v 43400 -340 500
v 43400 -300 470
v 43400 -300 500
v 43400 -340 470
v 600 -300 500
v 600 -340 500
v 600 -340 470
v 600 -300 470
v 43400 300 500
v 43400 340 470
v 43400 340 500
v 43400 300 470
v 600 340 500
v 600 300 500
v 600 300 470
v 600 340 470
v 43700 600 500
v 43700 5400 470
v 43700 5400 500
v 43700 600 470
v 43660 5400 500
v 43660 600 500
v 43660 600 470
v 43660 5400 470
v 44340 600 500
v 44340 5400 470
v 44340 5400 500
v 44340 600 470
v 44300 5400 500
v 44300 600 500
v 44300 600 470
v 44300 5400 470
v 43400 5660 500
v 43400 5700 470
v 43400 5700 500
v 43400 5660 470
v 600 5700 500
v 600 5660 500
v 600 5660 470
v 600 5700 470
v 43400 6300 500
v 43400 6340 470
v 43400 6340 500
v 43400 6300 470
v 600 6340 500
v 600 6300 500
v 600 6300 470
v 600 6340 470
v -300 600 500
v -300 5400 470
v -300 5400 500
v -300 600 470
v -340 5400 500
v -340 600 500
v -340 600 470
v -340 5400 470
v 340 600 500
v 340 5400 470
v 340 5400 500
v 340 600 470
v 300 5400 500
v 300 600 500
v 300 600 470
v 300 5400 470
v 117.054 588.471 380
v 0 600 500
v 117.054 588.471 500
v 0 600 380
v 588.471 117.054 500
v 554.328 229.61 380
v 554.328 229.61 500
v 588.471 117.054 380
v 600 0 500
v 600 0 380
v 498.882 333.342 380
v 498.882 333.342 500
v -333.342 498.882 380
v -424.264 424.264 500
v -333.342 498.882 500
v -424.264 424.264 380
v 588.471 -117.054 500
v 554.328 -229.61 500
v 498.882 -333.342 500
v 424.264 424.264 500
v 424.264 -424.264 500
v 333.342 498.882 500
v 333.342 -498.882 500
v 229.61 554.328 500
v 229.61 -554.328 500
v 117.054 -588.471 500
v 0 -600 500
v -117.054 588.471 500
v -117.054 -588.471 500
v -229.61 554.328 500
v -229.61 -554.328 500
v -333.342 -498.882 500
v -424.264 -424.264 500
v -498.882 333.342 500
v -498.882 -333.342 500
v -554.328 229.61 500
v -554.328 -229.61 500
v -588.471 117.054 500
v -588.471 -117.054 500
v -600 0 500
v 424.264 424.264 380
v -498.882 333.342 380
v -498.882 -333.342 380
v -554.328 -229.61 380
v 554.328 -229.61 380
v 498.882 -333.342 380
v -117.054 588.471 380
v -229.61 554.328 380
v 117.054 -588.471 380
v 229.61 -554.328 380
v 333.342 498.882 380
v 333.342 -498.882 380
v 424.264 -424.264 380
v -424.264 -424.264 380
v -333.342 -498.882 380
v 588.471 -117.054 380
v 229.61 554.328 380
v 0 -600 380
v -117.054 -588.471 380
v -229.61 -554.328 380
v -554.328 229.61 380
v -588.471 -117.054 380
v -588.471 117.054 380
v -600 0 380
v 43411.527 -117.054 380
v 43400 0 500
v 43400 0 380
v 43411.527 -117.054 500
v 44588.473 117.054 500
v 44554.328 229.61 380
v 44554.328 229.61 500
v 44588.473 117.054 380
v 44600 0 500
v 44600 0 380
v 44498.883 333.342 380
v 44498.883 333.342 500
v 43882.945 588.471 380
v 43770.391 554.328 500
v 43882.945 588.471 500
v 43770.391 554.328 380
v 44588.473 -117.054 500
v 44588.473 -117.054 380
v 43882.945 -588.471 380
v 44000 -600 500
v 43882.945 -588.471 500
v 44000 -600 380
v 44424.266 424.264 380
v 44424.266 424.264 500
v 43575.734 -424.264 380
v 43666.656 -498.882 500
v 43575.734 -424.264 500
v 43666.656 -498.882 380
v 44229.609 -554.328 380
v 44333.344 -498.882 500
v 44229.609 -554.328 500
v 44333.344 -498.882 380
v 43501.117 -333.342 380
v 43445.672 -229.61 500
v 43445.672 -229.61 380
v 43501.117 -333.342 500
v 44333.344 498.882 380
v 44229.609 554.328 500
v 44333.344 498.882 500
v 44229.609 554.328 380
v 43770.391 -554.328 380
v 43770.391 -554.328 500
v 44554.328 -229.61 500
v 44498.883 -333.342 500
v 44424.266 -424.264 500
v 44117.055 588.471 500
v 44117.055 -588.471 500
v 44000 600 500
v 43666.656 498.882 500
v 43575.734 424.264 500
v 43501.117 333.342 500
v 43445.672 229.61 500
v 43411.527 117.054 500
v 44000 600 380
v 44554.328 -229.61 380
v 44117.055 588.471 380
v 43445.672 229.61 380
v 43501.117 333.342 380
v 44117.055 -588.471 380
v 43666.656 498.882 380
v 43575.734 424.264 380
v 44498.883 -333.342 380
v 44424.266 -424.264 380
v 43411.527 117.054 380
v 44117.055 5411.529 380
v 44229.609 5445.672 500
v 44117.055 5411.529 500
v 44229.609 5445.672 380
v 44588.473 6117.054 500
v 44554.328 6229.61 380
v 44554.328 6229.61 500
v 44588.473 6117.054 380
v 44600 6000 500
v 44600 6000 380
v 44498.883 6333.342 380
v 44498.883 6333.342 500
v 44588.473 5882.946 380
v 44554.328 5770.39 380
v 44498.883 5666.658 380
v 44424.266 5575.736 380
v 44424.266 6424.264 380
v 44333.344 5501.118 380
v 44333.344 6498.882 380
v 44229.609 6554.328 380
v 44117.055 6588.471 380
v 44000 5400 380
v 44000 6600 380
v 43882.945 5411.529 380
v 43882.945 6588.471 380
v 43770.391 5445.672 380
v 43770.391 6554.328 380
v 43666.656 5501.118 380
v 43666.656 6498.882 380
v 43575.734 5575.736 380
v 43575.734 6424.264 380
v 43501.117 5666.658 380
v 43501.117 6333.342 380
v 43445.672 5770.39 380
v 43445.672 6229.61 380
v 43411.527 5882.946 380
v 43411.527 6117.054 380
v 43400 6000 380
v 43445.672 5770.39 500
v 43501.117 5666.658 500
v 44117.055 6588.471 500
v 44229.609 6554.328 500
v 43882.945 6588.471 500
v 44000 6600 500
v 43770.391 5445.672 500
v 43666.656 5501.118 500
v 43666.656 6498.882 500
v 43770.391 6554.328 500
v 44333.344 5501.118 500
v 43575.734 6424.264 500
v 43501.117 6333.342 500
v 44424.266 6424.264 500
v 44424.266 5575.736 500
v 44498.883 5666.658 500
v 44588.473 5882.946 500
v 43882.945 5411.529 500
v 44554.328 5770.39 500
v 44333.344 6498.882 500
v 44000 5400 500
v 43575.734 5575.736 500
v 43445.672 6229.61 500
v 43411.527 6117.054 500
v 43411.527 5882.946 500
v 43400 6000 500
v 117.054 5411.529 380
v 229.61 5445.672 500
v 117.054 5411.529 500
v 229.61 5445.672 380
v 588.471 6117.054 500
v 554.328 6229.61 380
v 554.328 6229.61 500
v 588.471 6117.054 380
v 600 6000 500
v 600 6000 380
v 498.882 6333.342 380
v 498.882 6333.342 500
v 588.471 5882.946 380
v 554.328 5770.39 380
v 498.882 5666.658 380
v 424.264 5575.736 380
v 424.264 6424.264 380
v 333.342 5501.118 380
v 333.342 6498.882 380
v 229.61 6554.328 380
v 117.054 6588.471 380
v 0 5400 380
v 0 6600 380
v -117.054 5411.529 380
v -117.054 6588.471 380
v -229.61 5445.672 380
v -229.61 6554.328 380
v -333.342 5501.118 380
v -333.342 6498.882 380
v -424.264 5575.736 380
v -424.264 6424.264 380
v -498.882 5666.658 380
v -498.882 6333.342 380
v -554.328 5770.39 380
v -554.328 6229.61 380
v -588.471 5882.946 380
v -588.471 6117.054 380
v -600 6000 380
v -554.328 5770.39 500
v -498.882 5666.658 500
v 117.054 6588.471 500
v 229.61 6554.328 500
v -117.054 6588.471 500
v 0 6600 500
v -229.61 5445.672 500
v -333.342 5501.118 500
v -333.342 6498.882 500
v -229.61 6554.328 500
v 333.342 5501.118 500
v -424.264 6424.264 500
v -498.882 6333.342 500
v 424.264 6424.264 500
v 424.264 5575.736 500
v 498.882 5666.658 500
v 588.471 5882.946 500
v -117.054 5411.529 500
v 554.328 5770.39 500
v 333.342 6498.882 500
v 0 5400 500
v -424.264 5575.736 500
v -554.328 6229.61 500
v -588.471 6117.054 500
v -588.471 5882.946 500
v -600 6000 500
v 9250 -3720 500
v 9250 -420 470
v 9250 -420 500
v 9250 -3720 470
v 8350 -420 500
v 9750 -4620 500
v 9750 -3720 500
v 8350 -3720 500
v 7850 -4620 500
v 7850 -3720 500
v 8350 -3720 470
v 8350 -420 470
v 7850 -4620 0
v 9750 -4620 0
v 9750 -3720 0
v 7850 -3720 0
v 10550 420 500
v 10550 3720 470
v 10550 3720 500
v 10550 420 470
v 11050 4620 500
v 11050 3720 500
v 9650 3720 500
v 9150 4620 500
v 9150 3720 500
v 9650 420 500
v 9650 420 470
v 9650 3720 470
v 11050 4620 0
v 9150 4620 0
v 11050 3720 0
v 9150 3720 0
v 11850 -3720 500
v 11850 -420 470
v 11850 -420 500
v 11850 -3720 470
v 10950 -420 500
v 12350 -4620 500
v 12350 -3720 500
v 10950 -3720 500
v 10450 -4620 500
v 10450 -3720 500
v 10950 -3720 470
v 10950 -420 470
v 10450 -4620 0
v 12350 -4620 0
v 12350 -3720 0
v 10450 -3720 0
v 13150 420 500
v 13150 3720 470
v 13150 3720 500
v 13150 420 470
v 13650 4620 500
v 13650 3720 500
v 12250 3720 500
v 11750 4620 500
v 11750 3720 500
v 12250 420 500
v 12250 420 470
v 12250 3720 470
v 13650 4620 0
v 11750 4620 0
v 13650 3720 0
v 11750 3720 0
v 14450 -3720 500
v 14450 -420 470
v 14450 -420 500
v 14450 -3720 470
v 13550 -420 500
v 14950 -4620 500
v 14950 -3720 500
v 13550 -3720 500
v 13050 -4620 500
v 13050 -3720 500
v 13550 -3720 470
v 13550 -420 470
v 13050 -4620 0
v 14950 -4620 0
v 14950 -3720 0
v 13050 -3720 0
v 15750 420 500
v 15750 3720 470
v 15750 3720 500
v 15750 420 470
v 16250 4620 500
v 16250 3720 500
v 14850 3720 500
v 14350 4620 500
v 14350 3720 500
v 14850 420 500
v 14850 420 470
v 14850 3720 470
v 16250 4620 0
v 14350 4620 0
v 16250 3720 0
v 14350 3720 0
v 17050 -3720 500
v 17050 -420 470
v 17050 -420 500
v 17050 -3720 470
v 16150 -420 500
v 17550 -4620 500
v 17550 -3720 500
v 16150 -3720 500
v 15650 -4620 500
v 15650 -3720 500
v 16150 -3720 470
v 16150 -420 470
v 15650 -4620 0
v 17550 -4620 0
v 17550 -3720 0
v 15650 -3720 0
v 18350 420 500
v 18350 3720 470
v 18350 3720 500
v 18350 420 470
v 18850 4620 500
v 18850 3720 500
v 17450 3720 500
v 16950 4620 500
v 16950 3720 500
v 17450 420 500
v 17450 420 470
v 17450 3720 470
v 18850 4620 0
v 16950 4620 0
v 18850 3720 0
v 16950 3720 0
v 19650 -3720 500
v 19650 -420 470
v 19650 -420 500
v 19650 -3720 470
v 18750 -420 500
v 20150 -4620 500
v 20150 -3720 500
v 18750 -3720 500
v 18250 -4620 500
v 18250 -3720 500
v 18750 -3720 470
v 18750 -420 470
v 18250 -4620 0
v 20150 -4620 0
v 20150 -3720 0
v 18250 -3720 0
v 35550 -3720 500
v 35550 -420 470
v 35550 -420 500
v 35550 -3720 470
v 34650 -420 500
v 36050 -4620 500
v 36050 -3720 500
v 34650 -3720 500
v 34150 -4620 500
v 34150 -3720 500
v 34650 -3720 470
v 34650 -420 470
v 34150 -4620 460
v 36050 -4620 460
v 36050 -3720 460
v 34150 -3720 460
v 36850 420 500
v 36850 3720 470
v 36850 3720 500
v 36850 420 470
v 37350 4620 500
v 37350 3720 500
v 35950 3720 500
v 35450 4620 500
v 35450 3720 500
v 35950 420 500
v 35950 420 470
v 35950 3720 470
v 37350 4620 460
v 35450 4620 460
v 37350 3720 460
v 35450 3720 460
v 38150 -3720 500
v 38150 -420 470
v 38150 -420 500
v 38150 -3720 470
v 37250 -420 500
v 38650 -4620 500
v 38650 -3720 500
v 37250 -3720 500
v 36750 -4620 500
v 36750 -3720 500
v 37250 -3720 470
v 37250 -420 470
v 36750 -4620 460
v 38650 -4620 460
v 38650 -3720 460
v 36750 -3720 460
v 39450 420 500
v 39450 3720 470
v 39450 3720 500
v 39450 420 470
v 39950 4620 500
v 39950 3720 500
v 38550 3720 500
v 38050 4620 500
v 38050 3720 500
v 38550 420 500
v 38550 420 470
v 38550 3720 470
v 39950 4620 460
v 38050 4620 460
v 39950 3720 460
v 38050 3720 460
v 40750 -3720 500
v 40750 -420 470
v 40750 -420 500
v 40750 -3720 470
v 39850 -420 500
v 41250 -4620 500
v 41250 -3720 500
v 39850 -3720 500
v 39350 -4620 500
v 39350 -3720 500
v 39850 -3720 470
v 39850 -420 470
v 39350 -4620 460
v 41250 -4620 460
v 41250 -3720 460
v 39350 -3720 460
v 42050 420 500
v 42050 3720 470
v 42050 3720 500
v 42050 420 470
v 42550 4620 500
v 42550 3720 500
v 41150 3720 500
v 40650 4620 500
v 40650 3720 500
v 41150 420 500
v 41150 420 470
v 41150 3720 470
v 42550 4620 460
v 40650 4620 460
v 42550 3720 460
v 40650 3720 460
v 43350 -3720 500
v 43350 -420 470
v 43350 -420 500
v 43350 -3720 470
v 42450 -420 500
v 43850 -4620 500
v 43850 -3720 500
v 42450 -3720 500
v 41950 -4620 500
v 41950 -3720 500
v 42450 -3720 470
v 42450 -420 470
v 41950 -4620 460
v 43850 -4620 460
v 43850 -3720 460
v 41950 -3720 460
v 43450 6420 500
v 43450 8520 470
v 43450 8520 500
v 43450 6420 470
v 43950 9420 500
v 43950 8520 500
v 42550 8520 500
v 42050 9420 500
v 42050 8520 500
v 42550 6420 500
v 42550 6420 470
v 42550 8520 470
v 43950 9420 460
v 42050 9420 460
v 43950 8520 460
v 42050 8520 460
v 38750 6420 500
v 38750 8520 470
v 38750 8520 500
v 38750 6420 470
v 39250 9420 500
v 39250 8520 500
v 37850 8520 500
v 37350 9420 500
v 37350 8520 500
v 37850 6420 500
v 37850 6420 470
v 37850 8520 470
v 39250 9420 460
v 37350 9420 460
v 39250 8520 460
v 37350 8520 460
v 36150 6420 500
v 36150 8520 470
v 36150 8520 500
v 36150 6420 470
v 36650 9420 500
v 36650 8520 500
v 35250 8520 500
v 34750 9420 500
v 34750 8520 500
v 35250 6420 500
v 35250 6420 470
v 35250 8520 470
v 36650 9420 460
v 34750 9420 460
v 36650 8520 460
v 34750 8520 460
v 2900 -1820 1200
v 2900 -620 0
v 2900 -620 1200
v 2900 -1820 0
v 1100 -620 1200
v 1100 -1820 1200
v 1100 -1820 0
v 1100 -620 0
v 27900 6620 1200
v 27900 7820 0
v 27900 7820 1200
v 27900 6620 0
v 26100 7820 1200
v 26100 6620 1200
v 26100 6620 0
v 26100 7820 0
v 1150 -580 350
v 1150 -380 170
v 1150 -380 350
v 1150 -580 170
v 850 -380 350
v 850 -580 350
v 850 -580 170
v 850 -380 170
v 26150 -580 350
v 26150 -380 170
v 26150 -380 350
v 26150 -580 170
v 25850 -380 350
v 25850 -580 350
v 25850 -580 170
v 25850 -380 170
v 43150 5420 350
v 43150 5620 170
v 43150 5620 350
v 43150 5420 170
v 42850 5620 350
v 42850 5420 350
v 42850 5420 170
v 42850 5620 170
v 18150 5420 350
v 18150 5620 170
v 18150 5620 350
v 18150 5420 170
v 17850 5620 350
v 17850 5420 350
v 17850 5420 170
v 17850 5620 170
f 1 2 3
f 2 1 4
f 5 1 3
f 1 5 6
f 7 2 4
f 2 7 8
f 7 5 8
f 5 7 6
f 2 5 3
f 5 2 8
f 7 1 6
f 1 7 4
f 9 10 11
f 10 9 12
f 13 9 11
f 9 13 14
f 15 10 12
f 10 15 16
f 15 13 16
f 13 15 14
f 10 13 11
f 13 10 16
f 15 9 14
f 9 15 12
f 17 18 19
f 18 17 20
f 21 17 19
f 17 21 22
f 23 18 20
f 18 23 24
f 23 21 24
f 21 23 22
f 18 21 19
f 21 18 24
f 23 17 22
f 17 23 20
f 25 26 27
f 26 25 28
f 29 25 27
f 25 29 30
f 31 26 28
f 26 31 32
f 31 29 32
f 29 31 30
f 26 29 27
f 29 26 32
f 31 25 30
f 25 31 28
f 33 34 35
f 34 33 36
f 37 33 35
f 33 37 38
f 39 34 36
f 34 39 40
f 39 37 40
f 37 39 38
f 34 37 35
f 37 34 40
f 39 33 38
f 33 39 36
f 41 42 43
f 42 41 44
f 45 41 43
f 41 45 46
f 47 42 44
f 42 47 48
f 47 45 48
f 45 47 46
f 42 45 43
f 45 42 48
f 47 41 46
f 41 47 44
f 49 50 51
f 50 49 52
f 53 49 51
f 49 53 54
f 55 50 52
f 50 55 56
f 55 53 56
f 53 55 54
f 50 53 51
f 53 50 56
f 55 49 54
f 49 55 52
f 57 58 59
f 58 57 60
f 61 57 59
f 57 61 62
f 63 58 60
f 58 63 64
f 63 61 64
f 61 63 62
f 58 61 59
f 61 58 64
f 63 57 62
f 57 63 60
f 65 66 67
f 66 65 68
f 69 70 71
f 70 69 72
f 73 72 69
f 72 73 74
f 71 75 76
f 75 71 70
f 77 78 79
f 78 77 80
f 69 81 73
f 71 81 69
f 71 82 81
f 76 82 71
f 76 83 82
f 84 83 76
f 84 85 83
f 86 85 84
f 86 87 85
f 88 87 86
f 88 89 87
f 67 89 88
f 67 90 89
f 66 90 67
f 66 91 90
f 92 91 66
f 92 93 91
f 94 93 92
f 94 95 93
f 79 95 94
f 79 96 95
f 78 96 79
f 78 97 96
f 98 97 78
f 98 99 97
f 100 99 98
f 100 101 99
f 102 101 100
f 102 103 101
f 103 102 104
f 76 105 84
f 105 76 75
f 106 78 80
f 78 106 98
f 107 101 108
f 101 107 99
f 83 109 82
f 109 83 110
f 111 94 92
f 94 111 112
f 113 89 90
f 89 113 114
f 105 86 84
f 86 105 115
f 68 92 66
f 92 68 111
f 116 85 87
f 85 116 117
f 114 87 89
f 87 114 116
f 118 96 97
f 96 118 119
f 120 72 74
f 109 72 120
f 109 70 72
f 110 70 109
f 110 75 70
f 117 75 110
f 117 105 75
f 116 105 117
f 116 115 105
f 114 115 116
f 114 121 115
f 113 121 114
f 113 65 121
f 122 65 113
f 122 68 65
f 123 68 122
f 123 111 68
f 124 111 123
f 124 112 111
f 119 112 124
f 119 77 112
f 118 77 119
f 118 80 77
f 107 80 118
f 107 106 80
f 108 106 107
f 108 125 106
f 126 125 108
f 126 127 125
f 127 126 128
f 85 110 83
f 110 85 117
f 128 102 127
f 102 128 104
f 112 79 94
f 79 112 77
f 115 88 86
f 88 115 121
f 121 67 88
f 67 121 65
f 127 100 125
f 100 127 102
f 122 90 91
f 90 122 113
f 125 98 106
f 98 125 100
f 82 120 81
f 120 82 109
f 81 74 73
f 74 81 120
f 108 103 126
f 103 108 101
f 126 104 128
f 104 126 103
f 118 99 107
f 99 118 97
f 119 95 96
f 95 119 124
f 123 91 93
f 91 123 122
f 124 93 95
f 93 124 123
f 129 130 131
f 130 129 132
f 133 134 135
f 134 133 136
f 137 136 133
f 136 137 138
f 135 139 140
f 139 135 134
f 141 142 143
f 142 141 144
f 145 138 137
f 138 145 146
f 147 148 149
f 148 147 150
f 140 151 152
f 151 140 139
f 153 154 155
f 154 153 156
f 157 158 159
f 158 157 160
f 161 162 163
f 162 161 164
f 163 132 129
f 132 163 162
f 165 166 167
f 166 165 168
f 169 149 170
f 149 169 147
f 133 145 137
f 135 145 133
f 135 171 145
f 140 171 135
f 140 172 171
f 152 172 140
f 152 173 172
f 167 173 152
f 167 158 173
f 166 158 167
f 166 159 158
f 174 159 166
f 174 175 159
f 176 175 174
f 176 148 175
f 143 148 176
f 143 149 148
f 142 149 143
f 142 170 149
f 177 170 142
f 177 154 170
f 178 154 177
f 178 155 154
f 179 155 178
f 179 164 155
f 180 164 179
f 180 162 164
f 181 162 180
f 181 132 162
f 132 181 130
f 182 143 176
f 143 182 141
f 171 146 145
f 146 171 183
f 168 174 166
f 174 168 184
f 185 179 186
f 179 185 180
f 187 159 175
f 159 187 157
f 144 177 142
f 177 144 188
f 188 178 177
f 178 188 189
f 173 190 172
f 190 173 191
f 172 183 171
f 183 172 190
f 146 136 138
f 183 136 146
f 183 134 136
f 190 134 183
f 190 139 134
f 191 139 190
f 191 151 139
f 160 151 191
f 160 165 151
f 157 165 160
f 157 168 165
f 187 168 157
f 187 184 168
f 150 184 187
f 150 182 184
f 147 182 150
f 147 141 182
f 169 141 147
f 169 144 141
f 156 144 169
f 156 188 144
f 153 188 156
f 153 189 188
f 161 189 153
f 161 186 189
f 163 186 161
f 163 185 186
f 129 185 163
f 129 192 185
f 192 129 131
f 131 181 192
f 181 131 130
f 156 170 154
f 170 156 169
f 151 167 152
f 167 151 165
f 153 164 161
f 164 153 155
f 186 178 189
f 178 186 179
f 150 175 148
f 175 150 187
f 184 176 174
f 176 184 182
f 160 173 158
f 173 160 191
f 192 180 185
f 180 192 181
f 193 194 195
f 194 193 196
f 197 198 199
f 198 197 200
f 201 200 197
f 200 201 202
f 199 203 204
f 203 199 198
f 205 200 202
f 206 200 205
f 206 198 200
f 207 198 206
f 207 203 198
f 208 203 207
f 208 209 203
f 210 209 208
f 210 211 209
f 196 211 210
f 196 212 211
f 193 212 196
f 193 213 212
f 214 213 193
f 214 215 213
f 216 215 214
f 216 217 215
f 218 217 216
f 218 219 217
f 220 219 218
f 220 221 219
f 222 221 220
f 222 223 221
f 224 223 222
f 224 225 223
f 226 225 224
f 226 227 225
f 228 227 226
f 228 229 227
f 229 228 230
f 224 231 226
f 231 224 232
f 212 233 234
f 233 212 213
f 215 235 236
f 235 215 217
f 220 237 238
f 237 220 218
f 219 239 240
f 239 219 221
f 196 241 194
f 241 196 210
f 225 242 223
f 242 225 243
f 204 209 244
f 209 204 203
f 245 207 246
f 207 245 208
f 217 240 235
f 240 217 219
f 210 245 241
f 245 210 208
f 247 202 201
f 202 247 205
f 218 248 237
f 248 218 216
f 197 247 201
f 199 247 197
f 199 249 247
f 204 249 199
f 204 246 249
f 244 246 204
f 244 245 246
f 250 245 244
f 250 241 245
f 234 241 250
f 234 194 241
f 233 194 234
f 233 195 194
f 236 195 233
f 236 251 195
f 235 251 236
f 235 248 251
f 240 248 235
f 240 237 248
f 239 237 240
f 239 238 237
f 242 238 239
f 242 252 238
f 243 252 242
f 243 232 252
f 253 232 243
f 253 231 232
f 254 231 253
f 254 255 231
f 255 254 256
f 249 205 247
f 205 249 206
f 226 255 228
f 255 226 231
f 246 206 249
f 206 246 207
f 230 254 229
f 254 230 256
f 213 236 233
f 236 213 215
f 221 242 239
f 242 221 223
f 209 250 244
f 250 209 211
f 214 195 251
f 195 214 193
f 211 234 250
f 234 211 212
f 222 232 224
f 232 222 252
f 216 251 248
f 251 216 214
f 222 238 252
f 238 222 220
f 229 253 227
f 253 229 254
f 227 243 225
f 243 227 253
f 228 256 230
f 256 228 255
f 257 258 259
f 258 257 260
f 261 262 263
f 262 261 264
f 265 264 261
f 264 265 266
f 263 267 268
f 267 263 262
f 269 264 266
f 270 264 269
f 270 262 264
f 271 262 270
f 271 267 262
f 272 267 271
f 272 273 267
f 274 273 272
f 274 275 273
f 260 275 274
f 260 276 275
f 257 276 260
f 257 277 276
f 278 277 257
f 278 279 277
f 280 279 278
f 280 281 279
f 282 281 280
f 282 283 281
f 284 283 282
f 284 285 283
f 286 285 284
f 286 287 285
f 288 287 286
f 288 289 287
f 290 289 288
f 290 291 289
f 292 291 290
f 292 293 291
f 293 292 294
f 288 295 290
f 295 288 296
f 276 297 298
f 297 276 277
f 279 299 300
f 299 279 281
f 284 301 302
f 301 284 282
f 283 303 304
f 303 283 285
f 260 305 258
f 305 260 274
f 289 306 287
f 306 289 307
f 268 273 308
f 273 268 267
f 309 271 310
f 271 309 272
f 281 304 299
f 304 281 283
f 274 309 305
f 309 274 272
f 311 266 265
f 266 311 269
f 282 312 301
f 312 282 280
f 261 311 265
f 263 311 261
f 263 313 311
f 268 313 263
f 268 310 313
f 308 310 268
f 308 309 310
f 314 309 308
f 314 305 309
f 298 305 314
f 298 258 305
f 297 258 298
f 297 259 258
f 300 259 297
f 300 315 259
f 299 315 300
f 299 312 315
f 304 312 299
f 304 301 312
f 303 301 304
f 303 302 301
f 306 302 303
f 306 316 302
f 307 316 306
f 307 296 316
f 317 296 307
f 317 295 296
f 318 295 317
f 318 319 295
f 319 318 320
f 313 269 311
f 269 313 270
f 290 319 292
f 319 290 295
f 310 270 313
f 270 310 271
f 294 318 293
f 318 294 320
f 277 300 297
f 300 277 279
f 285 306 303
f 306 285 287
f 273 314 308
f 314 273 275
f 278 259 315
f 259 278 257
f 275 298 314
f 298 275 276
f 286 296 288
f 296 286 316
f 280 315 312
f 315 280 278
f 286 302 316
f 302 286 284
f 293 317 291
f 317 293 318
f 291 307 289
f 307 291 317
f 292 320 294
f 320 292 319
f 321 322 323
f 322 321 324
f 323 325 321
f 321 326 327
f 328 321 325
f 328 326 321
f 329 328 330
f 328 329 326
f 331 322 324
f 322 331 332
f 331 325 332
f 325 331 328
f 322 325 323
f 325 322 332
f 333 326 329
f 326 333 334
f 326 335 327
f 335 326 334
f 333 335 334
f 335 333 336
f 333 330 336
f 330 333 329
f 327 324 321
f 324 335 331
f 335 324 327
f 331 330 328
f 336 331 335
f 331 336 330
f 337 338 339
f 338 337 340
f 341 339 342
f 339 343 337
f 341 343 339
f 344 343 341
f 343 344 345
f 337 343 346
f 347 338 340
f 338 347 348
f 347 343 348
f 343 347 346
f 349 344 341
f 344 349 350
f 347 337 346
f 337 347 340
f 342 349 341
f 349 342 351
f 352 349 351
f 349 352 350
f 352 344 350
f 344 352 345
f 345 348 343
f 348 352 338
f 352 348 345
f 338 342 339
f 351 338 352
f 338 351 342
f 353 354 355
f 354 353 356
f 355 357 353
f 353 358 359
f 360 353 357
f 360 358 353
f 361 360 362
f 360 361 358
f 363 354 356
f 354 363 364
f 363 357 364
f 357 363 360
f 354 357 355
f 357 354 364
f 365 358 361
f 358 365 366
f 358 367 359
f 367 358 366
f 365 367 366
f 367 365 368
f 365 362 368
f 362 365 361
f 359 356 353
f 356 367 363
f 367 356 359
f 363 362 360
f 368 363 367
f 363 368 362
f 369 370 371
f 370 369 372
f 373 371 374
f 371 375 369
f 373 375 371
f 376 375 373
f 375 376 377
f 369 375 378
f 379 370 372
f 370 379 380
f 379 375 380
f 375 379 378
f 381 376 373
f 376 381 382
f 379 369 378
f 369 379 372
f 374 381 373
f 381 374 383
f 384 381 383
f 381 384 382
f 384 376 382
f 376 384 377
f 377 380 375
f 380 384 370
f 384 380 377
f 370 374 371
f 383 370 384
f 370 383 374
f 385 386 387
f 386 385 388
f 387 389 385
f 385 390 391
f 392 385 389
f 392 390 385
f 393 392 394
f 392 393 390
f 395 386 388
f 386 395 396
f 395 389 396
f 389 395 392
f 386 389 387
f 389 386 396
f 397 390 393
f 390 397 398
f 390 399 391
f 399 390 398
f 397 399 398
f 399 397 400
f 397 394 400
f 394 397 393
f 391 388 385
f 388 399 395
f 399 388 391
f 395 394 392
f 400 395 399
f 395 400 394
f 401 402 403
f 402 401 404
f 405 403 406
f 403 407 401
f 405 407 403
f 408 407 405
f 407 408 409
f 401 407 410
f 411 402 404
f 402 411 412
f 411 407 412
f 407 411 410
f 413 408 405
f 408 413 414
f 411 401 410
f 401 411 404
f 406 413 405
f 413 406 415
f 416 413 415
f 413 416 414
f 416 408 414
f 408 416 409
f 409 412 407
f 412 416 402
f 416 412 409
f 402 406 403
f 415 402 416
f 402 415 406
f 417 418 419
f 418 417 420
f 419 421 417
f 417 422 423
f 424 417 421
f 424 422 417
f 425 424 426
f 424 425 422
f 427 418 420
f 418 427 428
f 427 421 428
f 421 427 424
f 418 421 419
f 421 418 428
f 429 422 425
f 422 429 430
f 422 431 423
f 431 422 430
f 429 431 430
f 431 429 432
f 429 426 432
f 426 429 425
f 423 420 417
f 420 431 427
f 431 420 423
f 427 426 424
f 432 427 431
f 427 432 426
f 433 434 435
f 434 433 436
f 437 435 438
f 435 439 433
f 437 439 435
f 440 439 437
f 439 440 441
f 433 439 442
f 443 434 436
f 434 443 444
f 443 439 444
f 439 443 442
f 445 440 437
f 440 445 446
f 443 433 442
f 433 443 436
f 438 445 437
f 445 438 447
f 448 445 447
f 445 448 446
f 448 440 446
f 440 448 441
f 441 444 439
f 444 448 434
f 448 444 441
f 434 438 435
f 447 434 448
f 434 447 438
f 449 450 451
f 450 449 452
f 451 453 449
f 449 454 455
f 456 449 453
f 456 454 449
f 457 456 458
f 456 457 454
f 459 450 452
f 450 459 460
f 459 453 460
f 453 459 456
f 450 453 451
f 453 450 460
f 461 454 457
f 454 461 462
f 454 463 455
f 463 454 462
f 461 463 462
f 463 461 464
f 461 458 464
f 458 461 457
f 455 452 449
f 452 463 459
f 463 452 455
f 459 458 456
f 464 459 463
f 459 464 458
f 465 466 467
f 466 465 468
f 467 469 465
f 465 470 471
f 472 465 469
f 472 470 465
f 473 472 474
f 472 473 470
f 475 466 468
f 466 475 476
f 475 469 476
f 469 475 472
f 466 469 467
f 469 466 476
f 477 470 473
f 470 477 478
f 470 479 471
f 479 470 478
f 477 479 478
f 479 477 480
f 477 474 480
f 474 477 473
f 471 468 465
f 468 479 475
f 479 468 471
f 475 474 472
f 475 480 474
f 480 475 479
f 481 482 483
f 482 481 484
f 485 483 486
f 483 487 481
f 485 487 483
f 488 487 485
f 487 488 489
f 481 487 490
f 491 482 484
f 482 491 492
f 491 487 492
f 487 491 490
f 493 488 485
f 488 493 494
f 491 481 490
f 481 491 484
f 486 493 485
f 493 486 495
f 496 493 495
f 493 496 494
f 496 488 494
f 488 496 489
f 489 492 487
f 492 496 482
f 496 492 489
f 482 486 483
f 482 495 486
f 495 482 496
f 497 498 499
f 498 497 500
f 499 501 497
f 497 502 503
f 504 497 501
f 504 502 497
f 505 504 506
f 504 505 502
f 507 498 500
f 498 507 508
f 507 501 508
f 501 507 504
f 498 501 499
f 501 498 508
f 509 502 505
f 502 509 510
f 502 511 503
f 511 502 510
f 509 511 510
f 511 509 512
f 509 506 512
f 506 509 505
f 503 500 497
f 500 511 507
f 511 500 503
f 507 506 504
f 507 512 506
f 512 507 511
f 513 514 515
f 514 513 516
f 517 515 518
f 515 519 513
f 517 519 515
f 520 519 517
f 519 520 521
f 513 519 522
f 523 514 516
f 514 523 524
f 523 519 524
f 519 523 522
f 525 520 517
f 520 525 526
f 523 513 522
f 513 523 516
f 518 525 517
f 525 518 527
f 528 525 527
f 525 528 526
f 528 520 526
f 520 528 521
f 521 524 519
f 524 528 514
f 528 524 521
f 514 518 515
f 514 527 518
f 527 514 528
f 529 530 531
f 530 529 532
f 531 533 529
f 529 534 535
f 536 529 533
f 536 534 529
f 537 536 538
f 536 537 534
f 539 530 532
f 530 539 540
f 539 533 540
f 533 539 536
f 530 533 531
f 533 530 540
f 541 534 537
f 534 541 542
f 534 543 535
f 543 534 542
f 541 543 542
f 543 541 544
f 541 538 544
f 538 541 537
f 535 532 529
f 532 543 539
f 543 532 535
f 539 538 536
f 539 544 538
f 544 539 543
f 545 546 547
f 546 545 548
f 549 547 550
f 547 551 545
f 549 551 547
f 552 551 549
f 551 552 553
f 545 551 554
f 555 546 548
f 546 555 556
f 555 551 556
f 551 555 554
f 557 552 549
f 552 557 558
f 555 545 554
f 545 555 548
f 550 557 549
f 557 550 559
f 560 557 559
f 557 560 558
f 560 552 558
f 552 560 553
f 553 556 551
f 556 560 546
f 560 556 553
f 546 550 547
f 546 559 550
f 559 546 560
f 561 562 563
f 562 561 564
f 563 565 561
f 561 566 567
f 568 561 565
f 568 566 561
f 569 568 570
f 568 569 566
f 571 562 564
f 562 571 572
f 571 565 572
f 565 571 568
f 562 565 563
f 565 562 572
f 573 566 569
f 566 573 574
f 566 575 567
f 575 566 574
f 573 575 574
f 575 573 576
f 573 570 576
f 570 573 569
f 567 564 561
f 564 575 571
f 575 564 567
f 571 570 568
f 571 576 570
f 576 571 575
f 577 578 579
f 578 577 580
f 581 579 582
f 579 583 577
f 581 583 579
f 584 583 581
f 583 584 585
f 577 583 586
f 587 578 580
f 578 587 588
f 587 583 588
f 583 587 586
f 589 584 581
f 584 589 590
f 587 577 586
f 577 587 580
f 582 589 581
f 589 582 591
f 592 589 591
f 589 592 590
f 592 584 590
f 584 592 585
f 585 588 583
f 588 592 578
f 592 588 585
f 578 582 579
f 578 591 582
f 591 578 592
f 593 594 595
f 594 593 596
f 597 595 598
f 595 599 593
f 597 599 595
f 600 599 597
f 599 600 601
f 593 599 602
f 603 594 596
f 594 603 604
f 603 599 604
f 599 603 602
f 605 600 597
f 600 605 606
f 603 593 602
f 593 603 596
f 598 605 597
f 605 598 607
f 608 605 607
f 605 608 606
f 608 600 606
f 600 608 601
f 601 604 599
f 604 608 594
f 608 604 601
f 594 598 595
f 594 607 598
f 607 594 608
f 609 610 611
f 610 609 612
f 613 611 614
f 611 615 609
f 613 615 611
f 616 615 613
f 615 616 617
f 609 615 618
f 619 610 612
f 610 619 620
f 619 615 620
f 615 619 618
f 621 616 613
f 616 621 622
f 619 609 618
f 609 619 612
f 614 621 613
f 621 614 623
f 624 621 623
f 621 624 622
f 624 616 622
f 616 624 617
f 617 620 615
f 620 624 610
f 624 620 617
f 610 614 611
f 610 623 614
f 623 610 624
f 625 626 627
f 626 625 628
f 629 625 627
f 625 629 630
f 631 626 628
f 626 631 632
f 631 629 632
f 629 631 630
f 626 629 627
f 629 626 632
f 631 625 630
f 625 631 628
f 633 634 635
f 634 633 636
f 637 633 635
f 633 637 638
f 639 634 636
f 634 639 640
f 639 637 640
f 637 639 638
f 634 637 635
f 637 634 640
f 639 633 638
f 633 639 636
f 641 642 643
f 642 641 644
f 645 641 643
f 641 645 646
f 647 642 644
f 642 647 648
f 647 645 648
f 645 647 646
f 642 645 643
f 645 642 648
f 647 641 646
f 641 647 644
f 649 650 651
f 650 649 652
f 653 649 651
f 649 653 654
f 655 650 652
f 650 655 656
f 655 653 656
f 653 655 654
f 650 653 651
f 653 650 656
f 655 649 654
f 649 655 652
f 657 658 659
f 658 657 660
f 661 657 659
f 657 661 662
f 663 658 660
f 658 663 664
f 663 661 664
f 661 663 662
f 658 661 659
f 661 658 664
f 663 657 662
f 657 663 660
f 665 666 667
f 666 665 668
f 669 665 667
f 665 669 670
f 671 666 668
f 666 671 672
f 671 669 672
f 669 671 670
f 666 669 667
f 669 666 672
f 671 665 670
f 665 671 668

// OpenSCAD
// loop_layout - generated by asm_3d.py from out/assembly/assembly_specs.json (F4.4) - units mm
// DESIGN - check and release before manufacture. z up, conveyor top z = 500.

module loop_layout() {
  translate([600.00, -340.00, 470.00]) cube([42800.00, 40.00, 30.00]);
  translate([600.00, 300.00, 470.00]) cube([42800.00, 40.00, 30.00]);
  translate([43660.00, 600.00, 470.00]) cube([40.00, 4800.00, 30.00]);
  translate([44300.00, 600.00, 470.00]) cube([40.00, 4800.00, 30.00]);
  translate([600.00, 5660.00, 470.00]) cube([42800.00, 40.00, 30.00]);
  translate([600.00, 6300.00, 470.00]) cube([42800.00, 40.00, 30.00]);
  translate([-340.00, 600.00, 470.00]) cube([40.00, 4800.00, 30.00]);
  translate([300.00, 600.00, 470.00]) cube([40.00, 4800.00, 30.00]);
  translate([0.00, 0.00, 440.00]) rotate([0, 0, 0]) cylinder(r = 600.00, h = 120.00, center = true, $fn = 32);
  translate([44000.00, 0.00, 440.00]) rotate([0, 0, 0]) cylinder(r = 600.00, h = 120.00, center = true, $fn = 32);
  translate([44000.00, 6000.00, 440.00]) rotate([0, 0, 0]) cylinder(r = 600.00, h = 120.00, center = true, $fn = 32);
  translate([0.00, 6000.00, 440.00]) rotate([0, 0, 0]) cylinder(r = 600.00, h = 120.00, center = true, $fn = 32);
  translate([8350.00, -4620.00, 470.00]) cube([900.00, 4200.00, 30.00]);
  translate([7850.00, -4620.00, 0.00]) cube([1900.00, 900.00, 500.00]);
  translate([9650.00, 420.00, 470.00]) cube([900.00, 4200.00, 30.00]);
  translate([9150.00, 3720.00, 0.00]) cube([1900.00, 900.00, 500.00]);
  translate([10950.00, -4620.00, 470.00]) cube([900.00, 4200.00, 30.00]);
  translate([10450.00, -4620.00, 0.00]) cube([1900.00, 900.00, 500.00]);
  translate([12250.00, 420.00, 470.00]) cube([900.00, 4200.00, 30.00]);
  translate([11750.00, 3720.00, 0.00]) cube([1900.00, 900.00, 500.00]);
  translate([13550.00, -4620.00, 470.00]) cube([900.00, 4200.00, 30.00]);
  translate([13050.00, -4620.00, 0.00]) cube([1900.00, 900.00, 500.00]);
  translate([14850.00, 420.00, 470.00]) cube([900.00, 4200.00, 30.00]);
  translate([14350.00, 3720.00, 0.00]) cube([1900.00, 900.00, 500.00]);
  translate([16150.00, -4620.00, 470.00]) cube([900.00, 4200.00, 30.00]);
  translate([15650.00, -4620.00, 0.00]) cube([1900.00, 900.00, 500.00]);
  translate([17450.00, 420.00, 470.00]) cube([900.00, 4200.00, 30.00]);
  translate([16950.00, 3720.00, 0.00]) cube([1900.00, 900.00, 500.00]);
  translate([18750.00, -4620.00, 470.00]) cube([900.00, 4200.00, 30.00]);
  translate([18250.00, -4620.00, 0.00]) cube([1900.00, 900.00, 500.00]);
  translate([34650.00, -4620.00, 470.00]) cube([900.00, 4200.00, 30.00]);
  translate([34150.00, -4620.00, 460.00]) cube([1900.00, 900.00, 40.00]);
  translate([35950.00, 420.00, 470.00]) cube([900.00, 4200.00, 30.00]);
  translate([35450.00, 3720.00, 460.00]) cube([1900.00, 900.00, 40.00]);
  translate([37250.00, -4620.00, 470.00]) cube([900.00, 4200.00, 30.00]);
  translate([36750.00, -4620.00, 460.00]) cube([1900.00, 900.00, 40.00]);
  translate([38550.00, 420.00, 470.00]) cube([900.00, 4200.00, 30.00]);
  translate([38050.00, 3720.00, 460.00]) cube([1900.00, 900.00, 40.00]);
  translate([39850.00, -4620.00, 470.00]) cube([900.00, 4200.00, 30.00]);
  translate([39350.00, -4620.00, 460.00]) cube([1900.00, 900.00, 40.00]);
  translate([41150.00, 420.00, 470.00]) cube([900.00, 4200.00, 30.00]);
  translate([40650.00, 3720.00, 460.00]) cube([1900.00, 900.00, 40.00]);
  translate([42450.00, -4620.00, 470.00]) cube([900.00, 4200.00, 30.00]);
  translate([41950.00, -4620.00, 460.00]) cube([1900.00, 900.00, 40.00]);
  translate([42550.00, 6420.00, 470.00]) cube([900.00, 3000.00, 30.00]);
  translate([42050.00, 8520.00, 460.00]) cube([1900.00, 900.00, 40.00]);
  translate([37850.00, 6420.00, 470.00]) cube([900.00, 3000.00, 30.00]);
  translate([37350.00, 8520.00, 460.00]) cube([1900.00, 900.00, 40.00]);
  translate([35250.00, 6420.00, 470.00]) cube([900.00, 3000.00, 30.00]);
  translate([34750.00, 8520.00, 460.00]) cube([1900.00, 900.00, 40.00]);
  translate([1100.00, -1820.00, 0.00]) cube([1800.00, 1200.00, 1200.00]);
  translate([26100.00, 6620.00, 0.00]) cube([1800.00, 1200.00, 1200.00]);
  translate([850.00, -580.00, 170.00]) cube([300.00, 200.00, 180.00]);
  translate([25850.00, -580.00, 170.00]) cube([300.00, 200.00, 180.00]);
  translate([42850.00, 5420.00, 170.00]) cube([300.00, 200.00, 180.00]);
  translate([17850.00, 5420.00, 170.00]) cube([300.00, 200.00, 180.00]);
}
loop_layout();
